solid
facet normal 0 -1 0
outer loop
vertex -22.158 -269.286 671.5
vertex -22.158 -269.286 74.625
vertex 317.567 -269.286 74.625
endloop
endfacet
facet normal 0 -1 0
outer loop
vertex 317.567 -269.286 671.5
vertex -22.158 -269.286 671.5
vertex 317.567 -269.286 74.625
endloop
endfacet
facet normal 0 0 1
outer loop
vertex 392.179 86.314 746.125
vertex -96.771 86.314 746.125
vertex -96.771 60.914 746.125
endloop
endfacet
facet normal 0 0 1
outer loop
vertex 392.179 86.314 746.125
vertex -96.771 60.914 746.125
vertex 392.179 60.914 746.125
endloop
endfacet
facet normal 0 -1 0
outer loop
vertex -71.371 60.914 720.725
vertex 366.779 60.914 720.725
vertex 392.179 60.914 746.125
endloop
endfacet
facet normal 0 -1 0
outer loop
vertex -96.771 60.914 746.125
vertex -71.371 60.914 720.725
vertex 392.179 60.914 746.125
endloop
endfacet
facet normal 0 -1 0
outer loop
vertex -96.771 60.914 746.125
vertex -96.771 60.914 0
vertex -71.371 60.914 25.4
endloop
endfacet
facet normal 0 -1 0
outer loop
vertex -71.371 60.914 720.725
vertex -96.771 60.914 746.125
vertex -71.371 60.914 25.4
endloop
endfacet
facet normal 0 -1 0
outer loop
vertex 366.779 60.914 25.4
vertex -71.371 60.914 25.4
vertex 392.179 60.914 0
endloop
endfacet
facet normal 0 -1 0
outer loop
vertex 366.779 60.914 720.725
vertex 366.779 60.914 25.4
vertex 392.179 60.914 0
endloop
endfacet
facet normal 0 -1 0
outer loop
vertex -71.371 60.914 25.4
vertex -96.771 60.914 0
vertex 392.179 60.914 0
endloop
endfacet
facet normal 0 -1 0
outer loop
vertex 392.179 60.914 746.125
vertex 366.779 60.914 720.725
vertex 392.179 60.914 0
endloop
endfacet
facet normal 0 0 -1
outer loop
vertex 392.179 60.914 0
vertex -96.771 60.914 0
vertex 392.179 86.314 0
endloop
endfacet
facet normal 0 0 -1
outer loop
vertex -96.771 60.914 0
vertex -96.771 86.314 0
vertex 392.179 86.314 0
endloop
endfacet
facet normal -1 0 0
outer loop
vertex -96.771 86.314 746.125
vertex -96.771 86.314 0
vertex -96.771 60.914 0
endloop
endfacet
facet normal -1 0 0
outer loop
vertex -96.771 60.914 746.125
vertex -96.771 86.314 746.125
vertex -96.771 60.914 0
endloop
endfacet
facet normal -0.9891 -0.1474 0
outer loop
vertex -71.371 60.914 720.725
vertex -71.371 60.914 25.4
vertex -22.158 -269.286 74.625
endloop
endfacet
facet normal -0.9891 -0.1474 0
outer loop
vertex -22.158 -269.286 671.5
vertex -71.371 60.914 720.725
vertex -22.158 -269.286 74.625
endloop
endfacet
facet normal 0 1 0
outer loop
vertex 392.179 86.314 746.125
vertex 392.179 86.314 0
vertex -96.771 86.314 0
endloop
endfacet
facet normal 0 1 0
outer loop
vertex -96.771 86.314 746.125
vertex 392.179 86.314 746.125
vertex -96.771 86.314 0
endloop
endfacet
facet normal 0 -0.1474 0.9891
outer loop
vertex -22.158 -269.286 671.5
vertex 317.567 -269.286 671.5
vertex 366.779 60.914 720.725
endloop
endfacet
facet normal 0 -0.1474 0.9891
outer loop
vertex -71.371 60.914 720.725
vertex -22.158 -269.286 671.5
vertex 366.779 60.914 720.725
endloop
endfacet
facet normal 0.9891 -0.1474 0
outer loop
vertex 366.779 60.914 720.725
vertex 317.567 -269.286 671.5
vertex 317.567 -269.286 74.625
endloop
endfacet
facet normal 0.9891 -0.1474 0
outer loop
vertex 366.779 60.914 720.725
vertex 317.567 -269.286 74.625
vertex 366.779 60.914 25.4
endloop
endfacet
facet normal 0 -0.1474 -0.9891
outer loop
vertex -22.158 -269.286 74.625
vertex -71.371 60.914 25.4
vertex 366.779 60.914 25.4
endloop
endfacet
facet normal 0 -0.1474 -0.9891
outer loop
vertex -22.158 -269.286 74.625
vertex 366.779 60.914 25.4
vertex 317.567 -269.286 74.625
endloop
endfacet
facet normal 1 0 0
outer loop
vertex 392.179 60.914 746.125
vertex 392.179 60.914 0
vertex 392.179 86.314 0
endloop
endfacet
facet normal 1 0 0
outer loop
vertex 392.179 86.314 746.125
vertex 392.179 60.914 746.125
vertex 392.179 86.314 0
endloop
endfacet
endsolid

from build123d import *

# Parameters (mm, degrees)
F1_DEPTH = 746.125
F3_DEPTH = 488.951


with BuildPart() as f1:
    # F0 (on Top) → F1 (new body)
    with BuildSketch(Plane.XY):
        Polygon((366.779292, 60.914483), (-71.370708, 60.914483), (-22.158208, -269.285517), (317.566792, -269.285517), align=None)
        Polygon((-96.770708, 60.914483), (-71.370708, 60.914483), (366.779292, 60.914483), (392.179292, 60.914483), (392.179292, 86.314483), (-96.770708, 86.314483), align=None)
    extrude(amount=F1_DEPTH)

    # F2 (on face) → F3 (cut, through all)
    with BuildSketch(Plane.YZ.offset(392.179292)):
        Polygon((60.914483, 720.725), (60.914483, 746.125), (-269.285517, 746.125), (-269.285517, 671.4998), align=None)
        Polygon((-269.285517, 74.6252), (-269.285517, 0), (60.914483, 0), (60.914483, 25.4), align=None)
    extrude(amount=-F3_DEPTH, mode=Mode.SUBTRACT)


solid = f1.part
